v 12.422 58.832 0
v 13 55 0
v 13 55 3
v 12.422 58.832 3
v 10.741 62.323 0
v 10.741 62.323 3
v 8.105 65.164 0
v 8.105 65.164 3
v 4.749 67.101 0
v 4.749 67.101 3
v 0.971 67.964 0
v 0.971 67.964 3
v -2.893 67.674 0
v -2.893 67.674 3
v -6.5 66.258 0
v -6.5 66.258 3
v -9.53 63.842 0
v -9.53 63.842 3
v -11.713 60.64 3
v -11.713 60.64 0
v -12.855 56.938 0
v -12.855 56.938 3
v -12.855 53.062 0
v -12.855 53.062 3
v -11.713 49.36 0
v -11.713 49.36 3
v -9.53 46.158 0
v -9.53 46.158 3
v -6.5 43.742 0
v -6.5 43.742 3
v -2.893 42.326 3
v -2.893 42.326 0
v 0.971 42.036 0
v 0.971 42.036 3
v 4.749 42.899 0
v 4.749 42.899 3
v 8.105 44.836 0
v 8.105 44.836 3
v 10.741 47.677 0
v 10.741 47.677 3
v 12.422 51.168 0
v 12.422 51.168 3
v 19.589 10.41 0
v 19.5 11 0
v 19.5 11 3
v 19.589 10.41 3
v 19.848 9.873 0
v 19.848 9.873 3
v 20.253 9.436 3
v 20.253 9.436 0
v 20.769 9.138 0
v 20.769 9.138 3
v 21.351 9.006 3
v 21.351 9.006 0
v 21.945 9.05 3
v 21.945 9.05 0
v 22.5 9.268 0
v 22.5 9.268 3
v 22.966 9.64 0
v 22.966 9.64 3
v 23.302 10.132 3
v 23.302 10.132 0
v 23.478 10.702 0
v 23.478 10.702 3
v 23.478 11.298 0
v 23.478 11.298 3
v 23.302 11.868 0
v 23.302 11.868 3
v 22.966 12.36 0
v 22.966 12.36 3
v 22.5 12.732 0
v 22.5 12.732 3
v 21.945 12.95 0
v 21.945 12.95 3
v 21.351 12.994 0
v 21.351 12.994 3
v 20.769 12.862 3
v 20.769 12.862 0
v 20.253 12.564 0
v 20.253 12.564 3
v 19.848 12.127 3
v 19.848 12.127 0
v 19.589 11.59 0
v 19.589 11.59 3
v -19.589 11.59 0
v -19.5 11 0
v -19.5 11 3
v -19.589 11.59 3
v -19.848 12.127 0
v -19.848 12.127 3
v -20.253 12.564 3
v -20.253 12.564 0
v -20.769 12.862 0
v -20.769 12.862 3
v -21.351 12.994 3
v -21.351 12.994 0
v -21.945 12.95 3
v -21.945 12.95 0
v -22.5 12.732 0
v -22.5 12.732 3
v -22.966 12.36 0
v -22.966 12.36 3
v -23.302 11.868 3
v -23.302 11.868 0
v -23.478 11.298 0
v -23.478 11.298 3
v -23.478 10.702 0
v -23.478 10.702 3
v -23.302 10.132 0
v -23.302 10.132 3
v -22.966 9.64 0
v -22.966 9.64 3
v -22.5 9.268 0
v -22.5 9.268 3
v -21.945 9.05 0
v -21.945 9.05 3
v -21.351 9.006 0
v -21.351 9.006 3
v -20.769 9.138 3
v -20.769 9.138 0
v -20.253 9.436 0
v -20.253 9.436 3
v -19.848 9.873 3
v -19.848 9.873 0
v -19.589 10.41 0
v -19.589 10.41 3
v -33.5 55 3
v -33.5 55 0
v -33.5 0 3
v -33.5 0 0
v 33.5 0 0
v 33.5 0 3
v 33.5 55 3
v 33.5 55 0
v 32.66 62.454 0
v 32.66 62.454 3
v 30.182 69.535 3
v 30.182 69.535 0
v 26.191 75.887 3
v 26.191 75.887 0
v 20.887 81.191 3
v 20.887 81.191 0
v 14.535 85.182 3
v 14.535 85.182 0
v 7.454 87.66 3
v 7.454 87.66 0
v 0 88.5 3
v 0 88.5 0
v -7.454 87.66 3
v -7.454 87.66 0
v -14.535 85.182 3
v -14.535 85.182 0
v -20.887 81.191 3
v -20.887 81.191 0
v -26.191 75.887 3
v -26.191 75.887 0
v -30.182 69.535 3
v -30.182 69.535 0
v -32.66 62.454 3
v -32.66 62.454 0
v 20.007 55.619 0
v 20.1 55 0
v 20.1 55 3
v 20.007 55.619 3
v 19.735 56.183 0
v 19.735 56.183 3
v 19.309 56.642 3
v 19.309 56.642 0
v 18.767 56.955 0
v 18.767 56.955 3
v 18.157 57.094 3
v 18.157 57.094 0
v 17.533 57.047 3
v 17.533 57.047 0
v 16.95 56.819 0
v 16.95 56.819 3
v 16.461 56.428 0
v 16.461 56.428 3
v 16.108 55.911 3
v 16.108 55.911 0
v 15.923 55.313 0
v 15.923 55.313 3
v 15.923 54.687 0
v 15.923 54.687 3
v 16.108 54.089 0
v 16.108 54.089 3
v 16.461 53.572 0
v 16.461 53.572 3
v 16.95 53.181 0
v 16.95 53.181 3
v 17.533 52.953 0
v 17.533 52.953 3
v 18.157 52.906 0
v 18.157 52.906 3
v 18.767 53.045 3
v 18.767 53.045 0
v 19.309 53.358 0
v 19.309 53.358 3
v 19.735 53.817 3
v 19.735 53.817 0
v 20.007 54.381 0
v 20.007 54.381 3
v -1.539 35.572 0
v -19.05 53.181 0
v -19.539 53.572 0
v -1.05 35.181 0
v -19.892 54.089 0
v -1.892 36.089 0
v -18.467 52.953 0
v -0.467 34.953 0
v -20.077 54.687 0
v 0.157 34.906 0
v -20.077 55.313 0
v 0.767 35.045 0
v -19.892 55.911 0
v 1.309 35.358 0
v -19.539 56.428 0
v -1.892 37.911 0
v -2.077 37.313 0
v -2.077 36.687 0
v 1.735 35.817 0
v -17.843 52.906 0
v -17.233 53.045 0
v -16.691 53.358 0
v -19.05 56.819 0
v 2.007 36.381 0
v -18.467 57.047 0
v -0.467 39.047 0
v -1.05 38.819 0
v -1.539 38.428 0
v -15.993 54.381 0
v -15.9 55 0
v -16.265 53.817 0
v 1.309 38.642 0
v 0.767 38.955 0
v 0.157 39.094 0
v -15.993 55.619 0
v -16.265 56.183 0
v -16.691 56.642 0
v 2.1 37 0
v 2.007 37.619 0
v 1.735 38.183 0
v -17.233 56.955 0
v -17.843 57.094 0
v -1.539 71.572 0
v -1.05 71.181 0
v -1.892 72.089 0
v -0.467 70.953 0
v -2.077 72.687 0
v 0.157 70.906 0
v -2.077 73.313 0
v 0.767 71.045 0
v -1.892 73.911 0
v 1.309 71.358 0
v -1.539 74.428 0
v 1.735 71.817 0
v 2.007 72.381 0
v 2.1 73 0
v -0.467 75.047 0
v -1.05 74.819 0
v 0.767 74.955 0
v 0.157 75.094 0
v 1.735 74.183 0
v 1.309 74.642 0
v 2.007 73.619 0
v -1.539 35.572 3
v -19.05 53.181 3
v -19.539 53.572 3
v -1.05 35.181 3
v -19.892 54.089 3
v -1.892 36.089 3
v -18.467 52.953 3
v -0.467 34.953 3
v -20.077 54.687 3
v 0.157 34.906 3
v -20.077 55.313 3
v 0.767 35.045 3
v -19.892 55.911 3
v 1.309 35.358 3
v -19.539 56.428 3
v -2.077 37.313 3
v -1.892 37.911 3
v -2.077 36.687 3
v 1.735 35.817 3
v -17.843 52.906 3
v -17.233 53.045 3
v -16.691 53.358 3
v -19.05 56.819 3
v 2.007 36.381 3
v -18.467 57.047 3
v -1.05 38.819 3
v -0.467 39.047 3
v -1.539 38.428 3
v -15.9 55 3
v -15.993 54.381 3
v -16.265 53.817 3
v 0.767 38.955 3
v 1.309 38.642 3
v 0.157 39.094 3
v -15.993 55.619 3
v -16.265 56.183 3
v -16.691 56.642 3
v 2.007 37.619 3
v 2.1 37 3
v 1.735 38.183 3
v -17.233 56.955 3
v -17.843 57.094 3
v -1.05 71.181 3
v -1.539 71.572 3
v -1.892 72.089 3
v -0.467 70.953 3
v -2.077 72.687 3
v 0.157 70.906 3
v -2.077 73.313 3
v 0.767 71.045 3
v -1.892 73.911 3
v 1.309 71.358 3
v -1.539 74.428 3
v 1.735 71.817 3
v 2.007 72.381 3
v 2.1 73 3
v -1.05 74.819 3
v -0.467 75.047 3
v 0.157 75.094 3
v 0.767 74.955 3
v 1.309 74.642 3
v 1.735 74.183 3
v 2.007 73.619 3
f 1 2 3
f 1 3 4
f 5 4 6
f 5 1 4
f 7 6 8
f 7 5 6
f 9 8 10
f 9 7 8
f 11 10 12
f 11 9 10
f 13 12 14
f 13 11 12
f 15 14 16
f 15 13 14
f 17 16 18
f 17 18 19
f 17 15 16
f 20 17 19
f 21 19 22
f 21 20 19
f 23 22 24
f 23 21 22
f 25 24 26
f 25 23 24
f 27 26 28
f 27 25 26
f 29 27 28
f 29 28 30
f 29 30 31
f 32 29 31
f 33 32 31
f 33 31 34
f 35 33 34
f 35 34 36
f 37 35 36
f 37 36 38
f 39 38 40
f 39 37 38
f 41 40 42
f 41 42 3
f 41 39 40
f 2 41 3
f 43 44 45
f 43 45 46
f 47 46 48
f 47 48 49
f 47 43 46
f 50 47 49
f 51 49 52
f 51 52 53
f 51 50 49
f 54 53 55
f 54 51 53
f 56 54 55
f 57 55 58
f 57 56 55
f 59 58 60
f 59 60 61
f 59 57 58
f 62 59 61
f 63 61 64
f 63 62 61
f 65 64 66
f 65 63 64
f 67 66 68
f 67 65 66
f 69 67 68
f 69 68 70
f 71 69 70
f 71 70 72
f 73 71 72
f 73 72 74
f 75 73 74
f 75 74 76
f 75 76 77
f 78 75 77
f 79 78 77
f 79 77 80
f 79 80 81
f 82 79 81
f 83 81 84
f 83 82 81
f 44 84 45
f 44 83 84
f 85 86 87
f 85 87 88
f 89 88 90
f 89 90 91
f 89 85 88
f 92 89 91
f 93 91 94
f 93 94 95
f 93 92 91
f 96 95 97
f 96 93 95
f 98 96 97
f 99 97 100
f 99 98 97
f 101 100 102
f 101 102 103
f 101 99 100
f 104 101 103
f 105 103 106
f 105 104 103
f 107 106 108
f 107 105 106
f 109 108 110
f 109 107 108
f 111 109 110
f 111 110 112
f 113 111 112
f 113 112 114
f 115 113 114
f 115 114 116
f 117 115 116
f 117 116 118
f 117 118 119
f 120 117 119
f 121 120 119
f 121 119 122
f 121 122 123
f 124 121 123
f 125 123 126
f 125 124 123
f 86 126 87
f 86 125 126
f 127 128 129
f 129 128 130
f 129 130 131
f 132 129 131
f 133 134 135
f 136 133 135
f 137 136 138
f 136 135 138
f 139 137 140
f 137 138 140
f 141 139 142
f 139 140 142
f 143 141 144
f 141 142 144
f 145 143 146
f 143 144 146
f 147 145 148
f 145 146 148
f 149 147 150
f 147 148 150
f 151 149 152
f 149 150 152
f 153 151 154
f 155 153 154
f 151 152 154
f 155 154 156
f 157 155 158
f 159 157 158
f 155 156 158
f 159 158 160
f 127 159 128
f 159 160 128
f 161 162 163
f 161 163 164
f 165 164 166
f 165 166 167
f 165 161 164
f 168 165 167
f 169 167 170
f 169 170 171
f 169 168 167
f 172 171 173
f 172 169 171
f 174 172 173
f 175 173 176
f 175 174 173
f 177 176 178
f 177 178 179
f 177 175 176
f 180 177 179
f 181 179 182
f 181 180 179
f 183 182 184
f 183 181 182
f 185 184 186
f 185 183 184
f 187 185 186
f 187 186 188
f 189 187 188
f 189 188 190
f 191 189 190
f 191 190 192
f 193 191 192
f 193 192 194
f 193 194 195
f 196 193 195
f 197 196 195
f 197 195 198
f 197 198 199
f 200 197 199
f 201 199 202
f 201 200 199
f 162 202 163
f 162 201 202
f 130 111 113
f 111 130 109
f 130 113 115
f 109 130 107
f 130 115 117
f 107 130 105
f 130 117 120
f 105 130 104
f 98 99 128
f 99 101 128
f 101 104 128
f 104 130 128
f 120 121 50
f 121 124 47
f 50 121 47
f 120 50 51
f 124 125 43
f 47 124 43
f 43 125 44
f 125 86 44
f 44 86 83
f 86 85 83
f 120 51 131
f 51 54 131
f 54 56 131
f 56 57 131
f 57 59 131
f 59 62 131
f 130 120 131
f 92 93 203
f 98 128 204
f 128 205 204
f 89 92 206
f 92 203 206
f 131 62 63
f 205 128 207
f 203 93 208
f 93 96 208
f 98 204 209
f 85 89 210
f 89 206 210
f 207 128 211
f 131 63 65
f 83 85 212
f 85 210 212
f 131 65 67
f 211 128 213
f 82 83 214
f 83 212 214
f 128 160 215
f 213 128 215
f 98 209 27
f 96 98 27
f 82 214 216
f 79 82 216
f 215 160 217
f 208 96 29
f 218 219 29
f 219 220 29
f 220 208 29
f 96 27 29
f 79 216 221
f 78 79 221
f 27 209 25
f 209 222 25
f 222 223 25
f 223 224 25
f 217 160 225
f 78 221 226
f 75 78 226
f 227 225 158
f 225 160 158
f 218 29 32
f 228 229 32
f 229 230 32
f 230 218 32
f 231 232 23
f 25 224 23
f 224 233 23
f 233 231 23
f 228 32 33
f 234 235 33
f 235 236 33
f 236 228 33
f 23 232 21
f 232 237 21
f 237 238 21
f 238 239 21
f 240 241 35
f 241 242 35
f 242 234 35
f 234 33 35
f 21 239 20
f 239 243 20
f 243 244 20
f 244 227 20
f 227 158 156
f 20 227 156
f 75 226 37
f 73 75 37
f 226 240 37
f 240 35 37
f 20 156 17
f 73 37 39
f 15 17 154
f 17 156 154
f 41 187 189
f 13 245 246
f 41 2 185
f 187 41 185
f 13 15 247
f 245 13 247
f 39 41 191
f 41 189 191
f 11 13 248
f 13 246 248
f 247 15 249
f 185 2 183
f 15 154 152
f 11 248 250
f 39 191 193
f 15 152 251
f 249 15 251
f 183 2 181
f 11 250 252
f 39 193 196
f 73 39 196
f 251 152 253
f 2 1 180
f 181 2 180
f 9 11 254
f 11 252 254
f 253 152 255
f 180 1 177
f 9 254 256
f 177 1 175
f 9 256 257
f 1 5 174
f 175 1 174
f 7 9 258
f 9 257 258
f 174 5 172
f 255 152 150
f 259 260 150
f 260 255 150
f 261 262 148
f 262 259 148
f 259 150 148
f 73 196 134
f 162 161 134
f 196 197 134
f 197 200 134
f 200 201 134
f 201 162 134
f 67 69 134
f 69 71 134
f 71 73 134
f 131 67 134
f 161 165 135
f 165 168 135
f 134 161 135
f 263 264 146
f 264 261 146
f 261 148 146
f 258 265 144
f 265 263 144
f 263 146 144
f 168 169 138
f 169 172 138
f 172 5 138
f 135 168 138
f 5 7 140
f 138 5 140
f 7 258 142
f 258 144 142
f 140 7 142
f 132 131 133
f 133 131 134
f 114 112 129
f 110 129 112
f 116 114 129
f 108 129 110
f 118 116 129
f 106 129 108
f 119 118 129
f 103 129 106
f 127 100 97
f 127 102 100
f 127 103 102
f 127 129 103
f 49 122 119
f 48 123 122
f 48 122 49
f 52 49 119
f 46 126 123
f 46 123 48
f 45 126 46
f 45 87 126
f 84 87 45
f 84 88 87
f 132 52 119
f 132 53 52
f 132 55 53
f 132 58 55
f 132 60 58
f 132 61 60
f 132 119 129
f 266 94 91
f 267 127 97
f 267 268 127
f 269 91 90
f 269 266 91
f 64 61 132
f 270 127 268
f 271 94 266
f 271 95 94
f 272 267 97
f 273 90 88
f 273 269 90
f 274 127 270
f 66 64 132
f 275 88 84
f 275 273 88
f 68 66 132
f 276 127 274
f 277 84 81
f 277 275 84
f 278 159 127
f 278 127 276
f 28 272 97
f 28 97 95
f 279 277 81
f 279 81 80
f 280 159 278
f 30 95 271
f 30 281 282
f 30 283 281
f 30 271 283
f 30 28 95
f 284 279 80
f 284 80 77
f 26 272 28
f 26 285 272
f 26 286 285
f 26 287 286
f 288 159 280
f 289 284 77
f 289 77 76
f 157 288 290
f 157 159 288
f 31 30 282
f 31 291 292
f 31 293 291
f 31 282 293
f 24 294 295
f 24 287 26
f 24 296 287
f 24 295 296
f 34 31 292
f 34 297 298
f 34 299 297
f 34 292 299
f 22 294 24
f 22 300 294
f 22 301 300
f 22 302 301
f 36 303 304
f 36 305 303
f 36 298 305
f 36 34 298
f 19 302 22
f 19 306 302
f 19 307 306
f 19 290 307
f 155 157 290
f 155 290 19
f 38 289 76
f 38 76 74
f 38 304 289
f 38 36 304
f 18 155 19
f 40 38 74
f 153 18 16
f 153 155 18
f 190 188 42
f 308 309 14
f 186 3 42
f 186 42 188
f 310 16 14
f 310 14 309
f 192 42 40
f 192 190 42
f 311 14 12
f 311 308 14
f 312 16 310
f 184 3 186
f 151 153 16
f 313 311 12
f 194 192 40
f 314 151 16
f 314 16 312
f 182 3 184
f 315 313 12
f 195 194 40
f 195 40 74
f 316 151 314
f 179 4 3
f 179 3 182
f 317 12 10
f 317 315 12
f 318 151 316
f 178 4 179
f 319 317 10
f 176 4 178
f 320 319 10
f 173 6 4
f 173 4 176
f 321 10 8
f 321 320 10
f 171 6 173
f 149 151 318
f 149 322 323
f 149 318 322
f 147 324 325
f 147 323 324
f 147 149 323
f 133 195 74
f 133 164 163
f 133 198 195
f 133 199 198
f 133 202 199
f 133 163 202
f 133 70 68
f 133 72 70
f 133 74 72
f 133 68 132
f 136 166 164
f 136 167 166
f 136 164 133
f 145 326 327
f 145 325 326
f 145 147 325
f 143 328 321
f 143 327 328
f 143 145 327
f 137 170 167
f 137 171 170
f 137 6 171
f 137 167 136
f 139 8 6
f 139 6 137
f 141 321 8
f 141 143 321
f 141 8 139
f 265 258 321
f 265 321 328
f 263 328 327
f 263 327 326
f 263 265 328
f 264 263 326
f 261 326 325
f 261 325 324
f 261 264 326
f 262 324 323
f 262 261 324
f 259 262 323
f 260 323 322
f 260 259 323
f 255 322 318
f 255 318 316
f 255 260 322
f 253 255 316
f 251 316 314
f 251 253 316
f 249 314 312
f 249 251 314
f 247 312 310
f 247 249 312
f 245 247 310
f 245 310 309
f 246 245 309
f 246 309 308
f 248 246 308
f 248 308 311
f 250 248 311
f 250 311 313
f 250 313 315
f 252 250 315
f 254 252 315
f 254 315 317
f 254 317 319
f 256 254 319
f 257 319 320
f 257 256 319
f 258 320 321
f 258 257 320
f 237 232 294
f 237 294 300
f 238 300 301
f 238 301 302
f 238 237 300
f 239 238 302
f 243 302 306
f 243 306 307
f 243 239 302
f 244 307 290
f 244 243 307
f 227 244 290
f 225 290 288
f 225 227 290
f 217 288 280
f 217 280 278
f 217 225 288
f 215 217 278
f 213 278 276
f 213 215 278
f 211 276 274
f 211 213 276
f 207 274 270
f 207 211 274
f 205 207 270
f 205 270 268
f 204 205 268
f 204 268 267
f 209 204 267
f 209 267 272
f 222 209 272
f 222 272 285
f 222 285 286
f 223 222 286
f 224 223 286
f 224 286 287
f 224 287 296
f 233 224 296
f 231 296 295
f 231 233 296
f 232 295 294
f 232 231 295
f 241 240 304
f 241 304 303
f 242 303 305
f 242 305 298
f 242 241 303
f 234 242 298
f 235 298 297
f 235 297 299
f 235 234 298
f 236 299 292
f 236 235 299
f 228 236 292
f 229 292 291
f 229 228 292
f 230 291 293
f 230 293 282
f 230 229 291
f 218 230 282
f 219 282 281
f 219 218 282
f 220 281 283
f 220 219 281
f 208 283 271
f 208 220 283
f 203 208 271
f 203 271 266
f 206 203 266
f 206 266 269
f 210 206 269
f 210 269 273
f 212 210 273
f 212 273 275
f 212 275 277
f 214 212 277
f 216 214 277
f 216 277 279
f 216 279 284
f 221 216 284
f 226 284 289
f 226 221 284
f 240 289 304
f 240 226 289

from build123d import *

# Parameters (mm, degrees)
SKETCH1_R           = 13
SKETCH1_R_2         = 2.1
SKETCH1_R_3         = 2
BOSS_EXTRUDE1_DEPTH = 3


with BuildPart() as part:
    # Sketch1 → Boss-Extrude1 (new body)
    with BuildSketch(Plane.XY):
        with BuildLine():
            Line((-33.5, 0), (33.5, 0))
            Line((33.5, 0), (33.5, 55))
            ThreePointArc((33.5, 55), (0, 88.5), (-33.5, 55))
            Line((-33.5, 55), (-33.5, 0))
        make_face()
        with Locations((0, 55)):
            Circle(SKETCH1_R, mode=Mode.SUBTRACT)
        with Locations((0, 37)):
            Circle(SKETCH1_R_2, mode=Mode.SUBTRACT)
        with Locations((-21.5, 11)):
            Circle(SKETCH1_R_3, mode=Mode.SUBTRACT)
        with Locations((21.5, 11)):
            Circle(SKETCH1_R_3, mode=Mode.SUBTRACT)
        with Locations((-18, 55)):
            Circle(SKETCH1_R_2, mode=Mode.SUBTRACT)
        with Locations((0, 73)):
            Circle(SKETCH1_R_2, mode=Mode.SUBTRACT)
        with Locations((18, 55)):
            Circle(SKETCH1_R_2, mode=Mode.SUBTRACT)
    extrude(amount=BOSS_EXTRUDE1_DEPTH)


solid = part.part
